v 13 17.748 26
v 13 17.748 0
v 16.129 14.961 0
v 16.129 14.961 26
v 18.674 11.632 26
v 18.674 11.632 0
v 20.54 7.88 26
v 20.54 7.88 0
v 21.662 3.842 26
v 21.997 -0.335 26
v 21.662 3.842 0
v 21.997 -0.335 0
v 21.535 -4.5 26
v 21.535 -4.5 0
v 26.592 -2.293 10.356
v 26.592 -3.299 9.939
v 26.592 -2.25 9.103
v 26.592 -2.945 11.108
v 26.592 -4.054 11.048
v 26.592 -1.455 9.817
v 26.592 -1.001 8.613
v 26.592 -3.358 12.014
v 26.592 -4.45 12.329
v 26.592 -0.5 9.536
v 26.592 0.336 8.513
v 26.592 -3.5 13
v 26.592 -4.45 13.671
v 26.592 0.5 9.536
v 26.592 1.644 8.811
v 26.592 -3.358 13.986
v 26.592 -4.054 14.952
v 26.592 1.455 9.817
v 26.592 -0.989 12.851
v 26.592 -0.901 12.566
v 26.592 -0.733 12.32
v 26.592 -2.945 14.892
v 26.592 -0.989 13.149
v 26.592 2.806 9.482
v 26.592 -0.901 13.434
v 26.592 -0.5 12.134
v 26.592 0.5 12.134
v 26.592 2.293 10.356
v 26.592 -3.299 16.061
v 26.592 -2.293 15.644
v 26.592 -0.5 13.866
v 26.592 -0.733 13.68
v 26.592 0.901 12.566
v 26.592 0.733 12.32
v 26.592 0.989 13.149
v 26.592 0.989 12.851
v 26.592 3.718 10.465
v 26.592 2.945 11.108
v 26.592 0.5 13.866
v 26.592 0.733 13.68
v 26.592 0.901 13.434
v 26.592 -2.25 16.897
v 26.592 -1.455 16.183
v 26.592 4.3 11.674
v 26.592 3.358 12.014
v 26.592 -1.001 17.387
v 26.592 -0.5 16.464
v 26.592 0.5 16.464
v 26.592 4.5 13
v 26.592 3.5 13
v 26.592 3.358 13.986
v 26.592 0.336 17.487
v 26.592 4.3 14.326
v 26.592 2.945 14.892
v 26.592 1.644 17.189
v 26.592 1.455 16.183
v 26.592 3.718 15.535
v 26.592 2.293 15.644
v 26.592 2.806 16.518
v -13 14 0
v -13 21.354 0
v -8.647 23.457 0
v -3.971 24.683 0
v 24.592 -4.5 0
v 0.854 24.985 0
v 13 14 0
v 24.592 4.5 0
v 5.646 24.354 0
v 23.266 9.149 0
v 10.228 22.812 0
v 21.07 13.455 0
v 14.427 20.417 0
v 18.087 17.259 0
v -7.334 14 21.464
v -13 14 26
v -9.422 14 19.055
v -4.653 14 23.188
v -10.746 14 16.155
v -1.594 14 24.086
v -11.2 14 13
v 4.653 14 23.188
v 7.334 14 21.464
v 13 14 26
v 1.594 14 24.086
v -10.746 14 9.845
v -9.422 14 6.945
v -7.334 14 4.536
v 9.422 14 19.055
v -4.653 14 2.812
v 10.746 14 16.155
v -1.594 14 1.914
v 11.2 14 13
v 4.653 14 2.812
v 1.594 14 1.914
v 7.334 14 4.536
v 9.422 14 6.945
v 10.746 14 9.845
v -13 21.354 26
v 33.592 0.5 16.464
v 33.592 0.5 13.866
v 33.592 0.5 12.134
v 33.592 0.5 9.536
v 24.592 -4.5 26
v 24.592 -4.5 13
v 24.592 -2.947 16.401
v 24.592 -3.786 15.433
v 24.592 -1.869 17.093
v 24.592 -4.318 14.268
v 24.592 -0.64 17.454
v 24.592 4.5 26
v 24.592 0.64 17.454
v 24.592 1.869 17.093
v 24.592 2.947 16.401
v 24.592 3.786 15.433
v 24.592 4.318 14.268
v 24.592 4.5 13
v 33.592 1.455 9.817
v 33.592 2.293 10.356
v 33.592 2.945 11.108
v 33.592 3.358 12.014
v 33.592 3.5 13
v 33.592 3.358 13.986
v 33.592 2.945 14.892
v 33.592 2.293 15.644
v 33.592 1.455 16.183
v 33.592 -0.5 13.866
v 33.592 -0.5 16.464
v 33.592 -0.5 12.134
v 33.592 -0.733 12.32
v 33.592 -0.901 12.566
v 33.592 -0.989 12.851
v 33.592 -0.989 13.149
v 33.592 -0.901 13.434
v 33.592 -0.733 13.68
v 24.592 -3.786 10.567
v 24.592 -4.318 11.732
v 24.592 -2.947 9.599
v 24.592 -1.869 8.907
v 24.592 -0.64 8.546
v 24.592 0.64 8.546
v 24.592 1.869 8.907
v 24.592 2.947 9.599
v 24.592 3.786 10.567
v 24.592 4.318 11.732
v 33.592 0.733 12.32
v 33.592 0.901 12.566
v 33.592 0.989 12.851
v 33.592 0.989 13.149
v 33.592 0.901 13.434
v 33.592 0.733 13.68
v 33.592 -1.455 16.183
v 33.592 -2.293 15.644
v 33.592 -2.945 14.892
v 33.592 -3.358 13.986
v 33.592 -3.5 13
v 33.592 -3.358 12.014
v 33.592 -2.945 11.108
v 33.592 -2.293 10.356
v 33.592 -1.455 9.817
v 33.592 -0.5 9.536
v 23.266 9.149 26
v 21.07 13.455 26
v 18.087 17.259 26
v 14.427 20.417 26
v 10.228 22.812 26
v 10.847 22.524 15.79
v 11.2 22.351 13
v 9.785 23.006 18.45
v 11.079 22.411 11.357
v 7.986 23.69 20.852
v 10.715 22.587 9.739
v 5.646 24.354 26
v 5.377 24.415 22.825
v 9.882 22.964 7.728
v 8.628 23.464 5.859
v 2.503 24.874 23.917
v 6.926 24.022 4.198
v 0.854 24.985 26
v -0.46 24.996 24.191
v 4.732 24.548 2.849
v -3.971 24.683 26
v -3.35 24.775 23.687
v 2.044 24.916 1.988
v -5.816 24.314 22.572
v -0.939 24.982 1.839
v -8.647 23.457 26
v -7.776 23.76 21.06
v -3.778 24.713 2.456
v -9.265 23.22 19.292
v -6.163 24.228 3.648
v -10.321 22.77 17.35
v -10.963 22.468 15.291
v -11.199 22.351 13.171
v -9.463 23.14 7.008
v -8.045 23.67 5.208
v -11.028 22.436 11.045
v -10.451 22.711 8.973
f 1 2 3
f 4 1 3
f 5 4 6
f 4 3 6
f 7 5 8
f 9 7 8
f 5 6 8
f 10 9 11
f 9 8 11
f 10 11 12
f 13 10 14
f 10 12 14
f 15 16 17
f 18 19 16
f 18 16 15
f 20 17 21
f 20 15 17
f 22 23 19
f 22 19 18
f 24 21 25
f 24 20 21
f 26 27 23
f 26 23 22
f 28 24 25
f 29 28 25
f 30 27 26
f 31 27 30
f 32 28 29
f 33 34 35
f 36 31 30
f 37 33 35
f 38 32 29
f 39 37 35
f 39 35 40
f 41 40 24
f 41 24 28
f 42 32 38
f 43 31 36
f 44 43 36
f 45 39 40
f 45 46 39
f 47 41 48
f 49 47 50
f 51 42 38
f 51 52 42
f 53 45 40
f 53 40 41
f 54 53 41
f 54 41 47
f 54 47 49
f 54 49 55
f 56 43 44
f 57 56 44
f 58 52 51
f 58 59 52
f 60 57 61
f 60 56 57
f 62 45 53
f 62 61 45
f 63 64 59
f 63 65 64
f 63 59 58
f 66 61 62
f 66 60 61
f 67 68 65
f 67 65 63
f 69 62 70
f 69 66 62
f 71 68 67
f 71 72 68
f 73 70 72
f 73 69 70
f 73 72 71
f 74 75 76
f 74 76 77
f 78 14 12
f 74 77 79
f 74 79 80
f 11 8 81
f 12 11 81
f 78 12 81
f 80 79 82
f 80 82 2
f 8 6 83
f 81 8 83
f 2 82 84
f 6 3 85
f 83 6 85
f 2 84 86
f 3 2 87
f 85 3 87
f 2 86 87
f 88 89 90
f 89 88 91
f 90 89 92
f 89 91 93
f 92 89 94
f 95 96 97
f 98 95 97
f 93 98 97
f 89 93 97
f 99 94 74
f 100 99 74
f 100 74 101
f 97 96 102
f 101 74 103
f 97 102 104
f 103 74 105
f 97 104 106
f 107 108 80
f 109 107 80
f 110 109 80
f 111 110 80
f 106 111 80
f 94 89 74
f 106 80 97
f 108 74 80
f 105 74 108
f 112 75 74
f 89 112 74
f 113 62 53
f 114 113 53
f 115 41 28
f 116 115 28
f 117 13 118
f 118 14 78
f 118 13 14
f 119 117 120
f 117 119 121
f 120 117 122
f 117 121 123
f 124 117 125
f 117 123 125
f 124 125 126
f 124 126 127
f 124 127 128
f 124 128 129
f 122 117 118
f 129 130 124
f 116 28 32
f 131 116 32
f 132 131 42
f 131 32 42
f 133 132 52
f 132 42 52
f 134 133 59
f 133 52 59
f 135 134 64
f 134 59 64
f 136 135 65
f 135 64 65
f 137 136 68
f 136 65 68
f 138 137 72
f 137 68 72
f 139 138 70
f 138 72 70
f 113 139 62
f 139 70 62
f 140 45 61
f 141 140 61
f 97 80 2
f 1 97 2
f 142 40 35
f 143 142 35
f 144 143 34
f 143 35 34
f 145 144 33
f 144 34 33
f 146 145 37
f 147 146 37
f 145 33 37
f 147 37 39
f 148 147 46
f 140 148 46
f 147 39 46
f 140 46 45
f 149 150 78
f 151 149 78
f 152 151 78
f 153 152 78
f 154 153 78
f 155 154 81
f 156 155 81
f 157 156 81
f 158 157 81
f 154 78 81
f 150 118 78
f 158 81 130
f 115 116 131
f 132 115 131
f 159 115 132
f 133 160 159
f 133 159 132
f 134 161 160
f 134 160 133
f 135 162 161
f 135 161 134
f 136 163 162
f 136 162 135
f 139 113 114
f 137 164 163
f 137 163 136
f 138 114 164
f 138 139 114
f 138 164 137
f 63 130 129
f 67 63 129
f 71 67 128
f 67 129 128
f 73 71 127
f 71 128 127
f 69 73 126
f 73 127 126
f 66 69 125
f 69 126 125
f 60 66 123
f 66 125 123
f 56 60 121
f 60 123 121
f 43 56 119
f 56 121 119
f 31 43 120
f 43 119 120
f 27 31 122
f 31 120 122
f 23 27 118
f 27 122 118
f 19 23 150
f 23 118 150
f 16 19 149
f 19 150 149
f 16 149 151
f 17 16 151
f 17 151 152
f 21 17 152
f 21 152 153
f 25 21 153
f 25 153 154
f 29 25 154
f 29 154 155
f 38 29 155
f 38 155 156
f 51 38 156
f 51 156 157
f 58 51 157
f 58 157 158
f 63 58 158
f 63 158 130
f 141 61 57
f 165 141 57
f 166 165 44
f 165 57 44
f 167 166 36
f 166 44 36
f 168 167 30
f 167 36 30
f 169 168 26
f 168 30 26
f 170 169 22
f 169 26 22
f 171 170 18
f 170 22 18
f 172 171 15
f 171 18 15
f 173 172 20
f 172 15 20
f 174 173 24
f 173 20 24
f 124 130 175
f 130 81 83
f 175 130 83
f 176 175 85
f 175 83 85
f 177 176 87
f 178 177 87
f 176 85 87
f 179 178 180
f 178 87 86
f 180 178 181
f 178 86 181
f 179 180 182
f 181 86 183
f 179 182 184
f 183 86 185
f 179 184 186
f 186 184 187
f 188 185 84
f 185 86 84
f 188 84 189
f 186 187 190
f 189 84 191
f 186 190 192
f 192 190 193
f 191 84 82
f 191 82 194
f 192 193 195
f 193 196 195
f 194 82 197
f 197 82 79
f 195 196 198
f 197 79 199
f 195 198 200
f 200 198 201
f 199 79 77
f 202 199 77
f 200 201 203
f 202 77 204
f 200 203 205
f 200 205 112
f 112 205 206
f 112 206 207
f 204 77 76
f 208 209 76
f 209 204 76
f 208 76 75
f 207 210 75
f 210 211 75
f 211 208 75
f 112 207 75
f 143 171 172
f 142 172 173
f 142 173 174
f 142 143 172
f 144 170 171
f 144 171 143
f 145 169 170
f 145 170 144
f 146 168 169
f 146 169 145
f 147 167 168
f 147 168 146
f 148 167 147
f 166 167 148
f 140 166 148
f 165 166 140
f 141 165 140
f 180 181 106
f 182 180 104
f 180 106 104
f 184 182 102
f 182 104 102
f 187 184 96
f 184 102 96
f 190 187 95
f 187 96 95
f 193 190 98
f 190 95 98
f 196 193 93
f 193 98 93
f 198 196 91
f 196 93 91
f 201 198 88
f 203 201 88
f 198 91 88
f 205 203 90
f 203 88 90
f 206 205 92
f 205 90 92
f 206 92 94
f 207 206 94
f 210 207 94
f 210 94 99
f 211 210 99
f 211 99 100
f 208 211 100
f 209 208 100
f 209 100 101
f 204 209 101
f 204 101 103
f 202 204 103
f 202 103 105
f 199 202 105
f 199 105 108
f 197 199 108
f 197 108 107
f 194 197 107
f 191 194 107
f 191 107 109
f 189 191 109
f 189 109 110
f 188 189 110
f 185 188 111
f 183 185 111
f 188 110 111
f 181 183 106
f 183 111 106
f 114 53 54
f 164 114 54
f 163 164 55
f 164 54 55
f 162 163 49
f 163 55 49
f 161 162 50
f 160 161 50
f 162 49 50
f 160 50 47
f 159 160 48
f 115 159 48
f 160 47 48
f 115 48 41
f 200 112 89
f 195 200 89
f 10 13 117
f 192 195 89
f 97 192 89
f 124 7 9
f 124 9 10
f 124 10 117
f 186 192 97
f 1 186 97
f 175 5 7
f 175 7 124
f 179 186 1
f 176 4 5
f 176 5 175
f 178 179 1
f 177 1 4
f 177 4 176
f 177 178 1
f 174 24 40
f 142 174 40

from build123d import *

# Parameters (mm, degrees)
F1_DEPTH = 26
F2_R     = 11.2
F3_DEPTH = 25
F5_DEPTH = 2
F7_DEPTH = 7


with BuildPart() as f1:
    # F0 (on Top) → F1 (new body)
    with BuildSketch(Plane.XY):
        with BuildLine():
            ThreePointArc((13, 17.748239), (20.54045, 7.879715), (21.534855, -4.5))
            Line((21.534855, -4.5), (24.591665, -4.5))
            Line((24.591665, -4.5), (24.591665, 4.5))
            ThreePointArc((24.591665, 4.5), (10.227772, 22.812117), (-13, 21.354157))
            Line((-13, 21.354157), (-13, 14))
            Line((-13, 14), (13, 14))
            Line((13, 14), (13, 17.748239))
        make_face()
    extrude(amount=F1_DEPTH)

    # F2 (on face) → F3 (cut)
    with BuildSketch(Plane.XZ.offset(-14)):
        with Locations((0, 13)):
            Circle(F2_R)
    extrude(amount=-F3_DEPTH, mode=Mode.SUBTRACT)

    # F4 (on face) → F5 (join)
    with BuildSketch(Plane.YZ.offset(24.591665)):
        with BuildLine():
            ThreePointArc((-4.5, 13), (0, 8.5), (4.5, 13))
            ThreePointArc((4.5, 13), (0, 17.5), (-4.5, 13))
        make_face()
    extrude(amount=F5_DEPTH)

    # F6 (on face) → F7 (join)
    with BuildSketch(Plane.YZ.offset(26.591665)):
        with BuildLine():
            ThreePointArc((0.5, 9.535898), (3.5, 13), (0.5, 16.464102))
            Line((0.5, 16.464102), (0.5, 13.866025))
            ThreePointArc((0.5, 13.866025), (1, 13), (0.5, 12.133975))
            Line((0.5, 12.133975), (0.5, 9.535898))
        make_face()
        with BuildLine():
            Line((-0.5, 13.866025), (-0.5, 16.464102))
            ThreePointArc((-0.5, 16.464102), (-3.5, 13), (-0.5, 9.535898))
            Line((-0.5, 9.535898), (-0.5, 12.133975))
            ThreePointArc((-0.5, 12.133975), (-1, 13), (-0.5, 13.866025))
        make_face()
    extrude(amount=F7_DEPTH)


solid = f1.part
